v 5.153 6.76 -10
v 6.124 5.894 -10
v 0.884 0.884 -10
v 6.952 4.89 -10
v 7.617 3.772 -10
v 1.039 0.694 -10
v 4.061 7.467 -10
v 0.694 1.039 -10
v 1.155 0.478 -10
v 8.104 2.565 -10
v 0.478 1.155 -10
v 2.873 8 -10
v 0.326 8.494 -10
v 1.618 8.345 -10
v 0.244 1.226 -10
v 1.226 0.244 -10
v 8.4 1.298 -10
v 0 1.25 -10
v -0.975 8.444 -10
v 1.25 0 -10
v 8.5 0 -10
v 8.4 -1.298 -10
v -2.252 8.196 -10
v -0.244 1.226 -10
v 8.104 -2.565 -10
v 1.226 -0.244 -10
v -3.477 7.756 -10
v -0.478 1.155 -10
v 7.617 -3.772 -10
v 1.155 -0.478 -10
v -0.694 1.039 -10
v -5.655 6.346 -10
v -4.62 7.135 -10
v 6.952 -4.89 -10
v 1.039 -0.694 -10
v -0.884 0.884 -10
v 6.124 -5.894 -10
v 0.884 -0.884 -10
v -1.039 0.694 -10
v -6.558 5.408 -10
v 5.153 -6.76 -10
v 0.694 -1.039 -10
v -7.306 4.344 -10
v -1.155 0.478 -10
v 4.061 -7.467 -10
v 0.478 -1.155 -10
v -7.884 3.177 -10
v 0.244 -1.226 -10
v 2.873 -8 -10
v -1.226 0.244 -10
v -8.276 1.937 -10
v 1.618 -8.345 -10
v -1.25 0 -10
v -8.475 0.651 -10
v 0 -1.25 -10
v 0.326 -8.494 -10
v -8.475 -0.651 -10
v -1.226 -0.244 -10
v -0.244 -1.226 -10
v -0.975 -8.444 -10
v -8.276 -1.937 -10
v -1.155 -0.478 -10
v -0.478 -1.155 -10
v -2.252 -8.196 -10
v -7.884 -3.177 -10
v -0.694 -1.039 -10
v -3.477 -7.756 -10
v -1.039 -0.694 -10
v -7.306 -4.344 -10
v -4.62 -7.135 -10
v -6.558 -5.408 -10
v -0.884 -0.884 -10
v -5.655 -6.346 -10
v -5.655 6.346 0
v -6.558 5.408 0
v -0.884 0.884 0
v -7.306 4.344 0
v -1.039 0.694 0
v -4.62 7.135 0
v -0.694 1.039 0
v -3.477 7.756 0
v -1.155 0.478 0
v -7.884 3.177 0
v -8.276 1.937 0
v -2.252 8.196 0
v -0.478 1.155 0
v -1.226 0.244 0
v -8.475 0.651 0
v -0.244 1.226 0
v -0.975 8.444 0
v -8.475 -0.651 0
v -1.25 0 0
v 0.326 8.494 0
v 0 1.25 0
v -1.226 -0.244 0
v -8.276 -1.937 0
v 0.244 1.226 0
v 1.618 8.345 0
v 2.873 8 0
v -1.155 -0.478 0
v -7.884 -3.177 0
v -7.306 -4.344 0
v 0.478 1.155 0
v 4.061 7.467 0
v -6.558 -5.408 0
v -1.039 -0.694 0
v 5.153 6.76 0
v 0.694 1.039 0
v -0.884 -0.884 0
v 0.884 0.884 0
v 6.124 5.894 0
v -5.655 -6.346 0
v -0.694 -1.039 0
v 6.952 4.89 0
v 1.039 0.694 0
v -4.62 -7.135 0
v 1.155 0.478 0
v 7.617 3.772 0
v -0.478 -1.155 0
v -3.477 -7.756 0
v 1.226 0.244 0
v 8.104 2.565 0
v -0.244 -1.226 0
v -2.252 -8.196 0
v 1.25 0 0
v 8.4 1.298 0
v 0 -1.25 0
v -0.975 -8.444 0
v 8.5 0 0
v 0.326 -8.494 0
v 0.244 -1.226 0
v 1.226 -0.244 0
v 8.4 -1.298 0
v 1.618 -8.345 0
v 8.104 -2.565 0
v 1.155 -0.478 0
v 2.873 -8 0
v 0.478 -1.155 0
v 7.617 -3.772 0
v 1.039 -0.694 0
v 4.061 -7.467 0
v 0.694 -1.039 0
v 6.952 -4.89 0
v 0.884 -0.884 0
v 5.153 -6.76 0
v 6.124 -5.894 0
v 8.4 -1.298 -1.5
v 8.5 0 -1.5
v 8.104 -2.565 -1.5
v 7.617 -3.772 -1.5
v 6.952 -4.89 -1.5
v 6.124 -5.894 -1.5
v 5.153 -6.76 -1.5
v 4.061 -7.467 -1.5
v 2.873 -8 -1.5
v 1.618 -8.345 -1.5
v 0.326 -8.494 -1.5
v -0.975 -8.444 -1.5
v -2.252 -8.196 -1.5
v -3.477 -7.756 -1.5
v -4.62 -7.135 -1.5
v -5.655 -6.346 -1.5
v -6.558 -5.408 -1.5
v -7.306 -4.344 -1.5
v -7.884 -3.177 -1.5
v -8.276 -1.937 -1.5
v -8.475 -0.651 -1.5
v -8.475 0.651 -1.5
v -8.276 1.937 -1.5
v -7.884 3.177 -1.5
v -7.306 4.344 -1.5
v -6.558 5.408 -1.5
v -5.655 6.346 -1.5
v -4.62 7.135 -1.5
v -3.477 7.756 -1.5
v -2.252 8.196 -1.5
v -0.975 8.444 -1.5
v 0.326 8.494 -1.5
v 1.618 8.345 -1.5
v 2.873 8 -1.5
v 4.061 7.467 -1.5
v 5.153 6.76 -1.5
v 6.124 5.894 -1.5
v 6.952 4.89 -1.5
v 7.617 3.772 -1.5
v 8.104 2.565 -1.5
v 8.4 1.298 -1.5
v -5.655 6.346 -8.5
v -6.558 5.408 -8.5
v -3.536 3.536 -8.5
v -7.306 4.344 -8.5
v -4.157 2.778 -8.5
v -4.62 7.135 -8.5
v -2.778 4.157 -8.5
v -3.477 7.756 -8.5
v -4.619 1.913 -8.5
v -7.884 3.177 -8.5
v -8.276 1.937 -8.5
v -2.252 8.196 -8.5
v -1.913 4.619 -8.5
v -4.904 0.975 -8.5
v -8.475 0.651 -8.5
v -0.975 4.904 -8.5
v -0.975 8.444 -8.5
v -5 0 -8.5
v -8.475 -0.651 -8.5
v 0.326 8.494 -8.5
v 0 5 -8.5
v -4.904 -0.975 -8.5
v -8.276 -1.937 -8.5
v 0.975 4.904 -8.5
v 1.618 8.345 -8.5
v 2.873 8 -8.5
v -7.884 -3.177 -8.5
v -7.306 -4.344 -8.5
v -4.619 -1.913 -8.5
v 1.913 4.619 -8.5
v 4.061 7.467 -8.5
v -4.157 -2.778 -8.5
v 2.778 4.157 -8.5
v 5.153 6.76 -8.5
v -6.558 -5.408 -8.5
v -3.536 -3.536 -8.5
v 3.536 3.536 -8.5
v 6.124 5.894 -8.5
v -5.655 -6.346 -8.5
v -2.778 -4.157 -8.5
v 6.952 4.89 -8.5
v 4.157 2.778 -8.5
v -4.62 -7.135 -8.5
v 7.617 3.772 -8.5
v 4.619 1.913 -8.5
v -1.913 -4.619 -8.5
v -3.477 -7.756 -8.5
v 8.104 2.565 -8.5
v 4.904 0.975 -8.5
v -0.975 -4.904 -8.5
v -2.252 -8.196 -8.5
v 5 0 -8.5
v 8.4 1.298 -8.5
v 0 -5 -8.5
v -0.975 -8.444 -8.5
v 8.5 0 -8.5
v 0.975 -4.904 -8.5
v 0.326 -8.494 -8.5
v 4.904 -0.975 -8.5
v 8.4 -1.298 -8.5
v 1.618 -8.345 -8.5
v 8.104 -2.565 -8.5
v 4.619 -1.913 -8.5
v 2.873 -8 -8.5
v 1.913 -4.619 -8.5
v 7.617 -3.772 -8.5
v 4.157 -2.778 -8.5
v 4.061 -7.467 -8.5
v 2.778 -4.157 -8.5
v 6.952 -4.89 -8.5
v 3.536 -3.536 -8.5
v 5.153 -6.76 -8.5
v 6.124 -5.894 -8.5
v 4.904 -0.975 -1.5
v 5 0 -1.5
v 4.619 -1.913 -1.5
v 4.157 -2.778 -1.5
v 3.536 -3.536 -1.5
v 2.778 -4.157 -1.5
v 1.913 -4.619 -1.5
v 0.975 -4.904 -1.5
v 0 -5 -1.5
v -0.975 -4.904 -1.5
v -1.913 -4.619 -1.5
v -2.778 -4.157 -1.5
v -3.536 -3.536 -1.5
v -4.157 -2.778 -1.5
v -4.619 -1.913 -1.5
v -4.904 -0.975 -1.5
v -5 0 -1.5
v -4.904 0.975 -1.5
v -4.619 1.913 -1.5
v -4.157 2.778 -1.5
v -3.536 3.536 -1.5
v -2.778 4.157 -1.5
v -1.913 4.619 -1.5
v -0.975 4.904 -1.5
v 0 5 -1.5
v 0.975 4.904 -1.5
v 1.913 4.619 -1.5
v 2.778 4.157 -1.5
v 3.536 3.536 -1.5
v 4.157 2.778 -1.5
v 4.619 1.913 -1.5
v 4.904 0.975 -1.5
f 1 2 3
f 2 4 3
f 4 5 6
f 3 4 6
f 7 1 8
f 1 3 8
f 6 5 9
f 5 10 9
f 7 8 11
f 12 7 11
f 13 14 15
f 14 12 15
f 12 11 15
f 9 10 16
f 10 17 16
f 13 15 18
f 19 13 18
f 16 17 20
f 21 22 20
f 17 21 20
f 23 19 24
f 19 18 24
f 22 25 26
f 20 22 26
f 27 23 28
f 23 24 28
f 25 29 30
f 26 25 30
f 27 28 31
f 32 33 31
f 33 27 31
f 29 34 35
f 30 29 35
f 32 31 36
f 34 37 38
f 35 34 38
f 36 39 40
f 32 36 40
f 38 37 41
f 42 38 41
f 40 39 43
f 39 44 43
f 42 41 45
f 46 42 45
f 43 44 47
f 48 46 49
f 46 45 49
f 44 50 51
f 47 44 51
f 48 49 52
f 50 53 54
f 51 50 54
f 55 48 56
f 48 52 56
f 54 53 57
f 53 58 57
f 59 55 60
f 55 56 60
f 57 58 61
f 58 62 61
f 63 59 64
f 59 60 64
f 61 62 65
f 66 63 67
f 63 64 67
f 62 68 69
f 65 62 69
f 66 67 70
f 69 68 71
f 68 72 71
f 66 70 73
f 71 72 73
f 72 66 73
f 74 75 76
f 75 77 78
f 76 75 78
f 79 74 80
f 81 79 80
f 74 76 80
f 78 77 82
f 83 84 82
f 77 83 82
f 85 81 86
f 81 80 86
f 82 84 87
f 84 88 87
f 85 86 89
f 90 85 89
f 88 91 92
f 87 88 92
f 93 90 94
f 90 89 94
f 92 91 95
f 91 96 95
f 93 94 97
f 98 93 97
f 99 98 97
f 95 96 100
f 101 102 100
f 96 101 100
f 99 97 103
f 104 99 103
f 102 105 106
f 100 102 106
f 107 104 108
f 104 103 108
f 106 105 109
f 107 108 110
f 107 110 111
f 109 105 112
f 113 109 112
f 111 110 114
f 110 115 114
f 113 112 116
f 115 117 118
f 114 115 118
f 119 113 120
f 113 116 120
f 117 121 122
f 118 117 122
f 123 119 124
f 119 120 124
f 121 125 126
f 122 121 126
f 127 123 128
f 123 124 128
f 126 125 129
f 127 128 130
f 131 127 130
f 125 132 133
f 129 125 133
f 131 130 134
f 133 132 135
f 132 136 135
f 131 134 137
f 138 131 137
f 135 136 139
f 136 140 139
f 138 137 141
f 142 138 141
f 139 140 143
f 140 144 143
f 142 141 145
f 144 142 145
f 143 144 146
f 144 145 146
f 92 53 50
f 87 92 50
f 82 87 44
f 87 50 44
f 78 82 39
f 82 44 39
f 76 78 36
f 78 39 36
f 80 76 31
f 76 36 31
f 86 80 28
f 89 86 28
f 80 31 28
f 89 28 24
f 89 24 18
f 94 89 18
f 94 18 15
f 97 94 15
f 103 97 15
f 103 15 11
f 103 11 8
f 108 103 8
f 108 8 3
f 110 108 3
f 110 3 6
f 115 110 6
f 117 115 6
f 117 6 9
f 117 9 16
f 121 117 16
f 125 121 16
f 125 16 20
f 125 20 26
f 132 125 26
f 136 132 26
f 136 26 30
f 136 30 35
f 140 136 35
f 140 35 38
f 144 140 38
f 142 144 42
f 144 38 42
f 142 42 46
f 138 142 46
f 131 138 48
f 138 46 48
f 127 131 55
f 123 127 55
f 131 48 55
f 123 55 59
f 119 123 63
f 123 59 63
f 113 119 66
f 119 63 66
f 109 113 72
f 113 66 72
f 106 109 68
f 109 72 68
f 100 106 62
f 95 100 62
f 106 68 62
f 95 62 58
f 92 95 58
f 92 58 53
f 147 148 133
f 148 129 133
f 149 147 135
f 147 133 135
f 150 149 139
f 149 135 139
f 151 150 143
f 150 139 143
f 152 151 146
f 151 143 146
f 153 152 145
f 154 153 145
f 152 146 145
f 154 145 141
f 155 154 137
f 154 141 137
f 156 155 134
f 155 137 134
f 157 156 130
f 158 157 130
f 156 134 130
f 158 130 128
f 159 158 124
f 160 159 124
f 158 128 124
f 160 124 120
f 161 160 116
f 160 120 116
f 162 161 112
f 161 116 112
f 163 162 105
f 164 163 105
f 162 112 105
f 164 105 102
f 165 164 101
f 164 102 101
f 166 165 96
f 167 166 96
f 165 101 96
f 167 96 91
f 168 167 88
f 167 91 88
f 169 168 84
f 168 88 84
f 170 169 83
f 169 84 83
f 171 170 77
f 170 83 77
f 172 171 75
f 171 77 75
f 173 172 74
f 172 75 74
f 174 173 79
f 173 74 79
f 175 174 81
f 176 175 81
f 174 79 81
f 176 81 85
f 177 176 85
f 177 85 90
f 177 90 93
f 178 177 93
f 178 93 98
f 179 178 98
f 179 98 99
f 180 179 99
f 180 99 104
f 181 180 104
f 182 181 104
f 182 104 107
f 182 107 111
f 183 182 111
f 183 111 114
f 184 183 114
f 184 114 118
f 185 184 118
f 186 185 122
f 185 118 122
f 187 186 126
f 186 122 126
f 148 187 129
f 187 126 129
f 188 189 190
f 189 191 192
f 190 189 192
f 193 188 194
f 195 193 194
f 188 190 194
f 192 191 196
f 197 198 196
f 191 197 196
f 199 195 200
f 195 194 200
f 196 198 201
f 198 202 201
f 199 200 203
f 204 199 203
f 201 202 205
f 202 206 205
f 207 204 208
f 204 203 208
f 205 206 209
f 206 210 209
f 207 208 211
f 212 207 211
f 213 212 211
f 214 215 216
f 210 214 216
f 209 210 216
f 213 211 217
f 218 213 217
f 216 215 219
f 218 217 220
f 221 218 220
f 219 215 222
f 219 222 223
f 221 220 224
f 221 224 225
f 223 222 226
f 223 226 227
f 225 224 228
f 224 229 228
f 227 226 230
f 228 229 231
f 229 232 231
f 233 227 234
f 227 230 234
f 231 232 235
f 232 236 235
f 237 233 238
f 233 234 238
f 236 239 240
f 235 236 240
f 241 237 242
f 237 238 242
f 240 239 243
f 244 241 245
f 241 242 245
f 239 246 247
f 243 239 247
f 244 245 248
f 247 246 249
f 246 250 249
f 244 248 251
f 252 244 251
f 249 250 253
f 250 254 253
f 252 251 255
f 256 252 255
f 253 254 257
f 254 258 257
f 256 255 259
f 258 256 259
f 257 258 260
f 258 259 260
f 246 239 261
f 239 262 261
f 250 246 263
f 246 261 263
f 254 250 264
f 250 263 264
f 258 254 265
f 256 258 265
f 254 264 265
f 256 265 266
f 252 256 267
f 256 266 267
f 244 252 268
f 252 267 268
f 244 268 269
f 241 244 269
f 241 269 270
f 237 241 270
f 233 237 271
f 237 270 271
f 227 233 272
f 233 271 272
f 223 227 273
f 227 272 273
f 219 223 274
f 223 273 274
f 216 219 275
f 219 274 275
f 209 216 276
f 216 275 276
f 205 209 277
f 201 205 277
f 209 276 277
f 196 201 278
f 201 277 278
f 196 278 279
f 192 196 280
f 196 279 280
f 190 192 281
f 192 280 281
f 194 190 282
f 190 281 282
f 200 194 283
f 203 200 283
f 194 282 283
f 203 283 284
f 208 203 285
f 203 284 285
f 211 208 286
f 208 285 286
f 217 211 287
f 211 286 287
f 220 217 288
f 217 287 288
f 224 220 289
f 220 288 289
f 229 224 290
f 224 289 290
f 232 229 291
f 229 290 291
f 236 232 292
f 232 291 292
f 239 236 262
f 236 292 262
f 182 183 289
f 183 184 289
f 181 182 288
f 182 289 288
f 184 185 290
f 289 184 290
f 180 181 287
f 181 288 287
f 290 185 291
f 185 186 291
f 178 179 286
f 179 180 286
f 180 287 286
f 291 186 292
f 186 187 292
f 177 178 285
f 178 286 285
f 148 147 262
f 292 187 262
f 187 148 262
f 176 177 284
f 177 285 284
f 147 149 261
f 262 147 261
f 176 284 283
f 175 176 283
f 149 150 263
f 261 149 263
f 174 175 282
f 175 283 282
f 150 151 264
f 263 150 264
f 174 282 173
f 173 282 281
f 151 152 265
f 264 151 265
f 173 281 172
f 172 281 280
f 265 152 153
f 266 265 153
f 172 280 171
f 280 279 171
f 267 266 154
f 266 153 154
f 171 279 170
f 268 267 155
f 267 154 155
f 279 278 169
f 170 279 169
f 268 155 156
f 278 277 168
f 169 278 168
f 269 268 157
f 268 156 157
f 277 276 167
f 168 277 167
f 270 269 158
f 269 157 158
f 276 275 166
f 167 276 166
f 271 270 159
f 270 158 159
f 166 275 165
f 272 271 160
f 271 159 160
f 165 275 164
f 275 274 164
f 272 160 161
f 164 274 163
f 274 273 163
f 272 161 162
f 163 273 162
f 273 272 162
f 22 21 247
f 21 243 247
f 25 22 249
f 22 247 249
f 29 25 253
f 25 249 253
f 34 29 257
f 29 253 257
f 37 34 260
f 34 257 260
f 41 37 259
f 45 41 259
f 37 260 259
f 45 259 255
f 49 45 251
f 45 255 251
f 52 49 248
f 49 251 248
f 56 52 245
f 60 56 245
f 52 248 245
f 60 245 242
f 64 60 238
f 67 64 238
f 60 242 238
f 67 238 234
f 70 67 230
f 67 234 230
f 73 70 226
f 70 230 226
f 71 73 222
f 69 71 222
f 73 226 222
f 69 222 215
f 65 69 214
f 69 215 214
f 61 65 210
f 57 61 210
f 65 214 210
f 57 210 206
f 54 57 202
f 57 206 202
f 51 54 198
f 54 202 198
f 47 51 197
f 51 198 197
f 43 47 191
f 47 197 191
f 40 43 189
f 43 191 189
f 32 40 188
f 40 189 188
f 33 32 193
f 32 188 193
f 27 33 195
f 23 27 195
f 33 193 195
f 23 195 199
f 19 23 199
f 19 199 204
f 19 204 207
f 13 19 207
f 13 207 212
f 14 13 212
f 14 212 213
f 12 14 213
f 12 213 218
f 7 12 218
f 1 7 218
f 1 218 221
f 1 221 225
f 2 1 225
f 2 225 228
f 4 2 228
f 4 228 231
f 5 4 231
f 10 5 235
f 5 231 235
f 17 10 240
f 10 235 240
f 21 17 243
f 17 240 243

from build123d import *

# Parameters (mm, degrees)
TALADRO_ROSCADO_M2_52_D = 2.5


with BuildPart() as part:
    # Sketch2 → Revolve1 (revolve)
    with BuildSketch(Plane(origin=(0, 0, 0), x_dir=(1, 0, 0), z_dir=(0, 1, 0)), mode=Mode.PRIVATE) as revolve1_sk:
        Polygon((0, 10), (-8.5, 10), (-8.5, 8.5), (-5, 8.5), (-5, 1.5), (-8.5, 1.5), (-8.5, 0), (0, 0), align=None)
    revolve(revolve1_sk.sketch.rotate(Axis((0, 0, 198.467795094), (0, 0, -1)), 180), axis=Axis((0, 0, 198.467795094), (0, 0, -1)))

    # Taladro roscado M2.52 (through all)
    with Locations(Plane.XY):
        with Locations((0, 0)):
            Hole(TALADRO_ROSCADO_M2_52_D / 2)


solid = part.part
